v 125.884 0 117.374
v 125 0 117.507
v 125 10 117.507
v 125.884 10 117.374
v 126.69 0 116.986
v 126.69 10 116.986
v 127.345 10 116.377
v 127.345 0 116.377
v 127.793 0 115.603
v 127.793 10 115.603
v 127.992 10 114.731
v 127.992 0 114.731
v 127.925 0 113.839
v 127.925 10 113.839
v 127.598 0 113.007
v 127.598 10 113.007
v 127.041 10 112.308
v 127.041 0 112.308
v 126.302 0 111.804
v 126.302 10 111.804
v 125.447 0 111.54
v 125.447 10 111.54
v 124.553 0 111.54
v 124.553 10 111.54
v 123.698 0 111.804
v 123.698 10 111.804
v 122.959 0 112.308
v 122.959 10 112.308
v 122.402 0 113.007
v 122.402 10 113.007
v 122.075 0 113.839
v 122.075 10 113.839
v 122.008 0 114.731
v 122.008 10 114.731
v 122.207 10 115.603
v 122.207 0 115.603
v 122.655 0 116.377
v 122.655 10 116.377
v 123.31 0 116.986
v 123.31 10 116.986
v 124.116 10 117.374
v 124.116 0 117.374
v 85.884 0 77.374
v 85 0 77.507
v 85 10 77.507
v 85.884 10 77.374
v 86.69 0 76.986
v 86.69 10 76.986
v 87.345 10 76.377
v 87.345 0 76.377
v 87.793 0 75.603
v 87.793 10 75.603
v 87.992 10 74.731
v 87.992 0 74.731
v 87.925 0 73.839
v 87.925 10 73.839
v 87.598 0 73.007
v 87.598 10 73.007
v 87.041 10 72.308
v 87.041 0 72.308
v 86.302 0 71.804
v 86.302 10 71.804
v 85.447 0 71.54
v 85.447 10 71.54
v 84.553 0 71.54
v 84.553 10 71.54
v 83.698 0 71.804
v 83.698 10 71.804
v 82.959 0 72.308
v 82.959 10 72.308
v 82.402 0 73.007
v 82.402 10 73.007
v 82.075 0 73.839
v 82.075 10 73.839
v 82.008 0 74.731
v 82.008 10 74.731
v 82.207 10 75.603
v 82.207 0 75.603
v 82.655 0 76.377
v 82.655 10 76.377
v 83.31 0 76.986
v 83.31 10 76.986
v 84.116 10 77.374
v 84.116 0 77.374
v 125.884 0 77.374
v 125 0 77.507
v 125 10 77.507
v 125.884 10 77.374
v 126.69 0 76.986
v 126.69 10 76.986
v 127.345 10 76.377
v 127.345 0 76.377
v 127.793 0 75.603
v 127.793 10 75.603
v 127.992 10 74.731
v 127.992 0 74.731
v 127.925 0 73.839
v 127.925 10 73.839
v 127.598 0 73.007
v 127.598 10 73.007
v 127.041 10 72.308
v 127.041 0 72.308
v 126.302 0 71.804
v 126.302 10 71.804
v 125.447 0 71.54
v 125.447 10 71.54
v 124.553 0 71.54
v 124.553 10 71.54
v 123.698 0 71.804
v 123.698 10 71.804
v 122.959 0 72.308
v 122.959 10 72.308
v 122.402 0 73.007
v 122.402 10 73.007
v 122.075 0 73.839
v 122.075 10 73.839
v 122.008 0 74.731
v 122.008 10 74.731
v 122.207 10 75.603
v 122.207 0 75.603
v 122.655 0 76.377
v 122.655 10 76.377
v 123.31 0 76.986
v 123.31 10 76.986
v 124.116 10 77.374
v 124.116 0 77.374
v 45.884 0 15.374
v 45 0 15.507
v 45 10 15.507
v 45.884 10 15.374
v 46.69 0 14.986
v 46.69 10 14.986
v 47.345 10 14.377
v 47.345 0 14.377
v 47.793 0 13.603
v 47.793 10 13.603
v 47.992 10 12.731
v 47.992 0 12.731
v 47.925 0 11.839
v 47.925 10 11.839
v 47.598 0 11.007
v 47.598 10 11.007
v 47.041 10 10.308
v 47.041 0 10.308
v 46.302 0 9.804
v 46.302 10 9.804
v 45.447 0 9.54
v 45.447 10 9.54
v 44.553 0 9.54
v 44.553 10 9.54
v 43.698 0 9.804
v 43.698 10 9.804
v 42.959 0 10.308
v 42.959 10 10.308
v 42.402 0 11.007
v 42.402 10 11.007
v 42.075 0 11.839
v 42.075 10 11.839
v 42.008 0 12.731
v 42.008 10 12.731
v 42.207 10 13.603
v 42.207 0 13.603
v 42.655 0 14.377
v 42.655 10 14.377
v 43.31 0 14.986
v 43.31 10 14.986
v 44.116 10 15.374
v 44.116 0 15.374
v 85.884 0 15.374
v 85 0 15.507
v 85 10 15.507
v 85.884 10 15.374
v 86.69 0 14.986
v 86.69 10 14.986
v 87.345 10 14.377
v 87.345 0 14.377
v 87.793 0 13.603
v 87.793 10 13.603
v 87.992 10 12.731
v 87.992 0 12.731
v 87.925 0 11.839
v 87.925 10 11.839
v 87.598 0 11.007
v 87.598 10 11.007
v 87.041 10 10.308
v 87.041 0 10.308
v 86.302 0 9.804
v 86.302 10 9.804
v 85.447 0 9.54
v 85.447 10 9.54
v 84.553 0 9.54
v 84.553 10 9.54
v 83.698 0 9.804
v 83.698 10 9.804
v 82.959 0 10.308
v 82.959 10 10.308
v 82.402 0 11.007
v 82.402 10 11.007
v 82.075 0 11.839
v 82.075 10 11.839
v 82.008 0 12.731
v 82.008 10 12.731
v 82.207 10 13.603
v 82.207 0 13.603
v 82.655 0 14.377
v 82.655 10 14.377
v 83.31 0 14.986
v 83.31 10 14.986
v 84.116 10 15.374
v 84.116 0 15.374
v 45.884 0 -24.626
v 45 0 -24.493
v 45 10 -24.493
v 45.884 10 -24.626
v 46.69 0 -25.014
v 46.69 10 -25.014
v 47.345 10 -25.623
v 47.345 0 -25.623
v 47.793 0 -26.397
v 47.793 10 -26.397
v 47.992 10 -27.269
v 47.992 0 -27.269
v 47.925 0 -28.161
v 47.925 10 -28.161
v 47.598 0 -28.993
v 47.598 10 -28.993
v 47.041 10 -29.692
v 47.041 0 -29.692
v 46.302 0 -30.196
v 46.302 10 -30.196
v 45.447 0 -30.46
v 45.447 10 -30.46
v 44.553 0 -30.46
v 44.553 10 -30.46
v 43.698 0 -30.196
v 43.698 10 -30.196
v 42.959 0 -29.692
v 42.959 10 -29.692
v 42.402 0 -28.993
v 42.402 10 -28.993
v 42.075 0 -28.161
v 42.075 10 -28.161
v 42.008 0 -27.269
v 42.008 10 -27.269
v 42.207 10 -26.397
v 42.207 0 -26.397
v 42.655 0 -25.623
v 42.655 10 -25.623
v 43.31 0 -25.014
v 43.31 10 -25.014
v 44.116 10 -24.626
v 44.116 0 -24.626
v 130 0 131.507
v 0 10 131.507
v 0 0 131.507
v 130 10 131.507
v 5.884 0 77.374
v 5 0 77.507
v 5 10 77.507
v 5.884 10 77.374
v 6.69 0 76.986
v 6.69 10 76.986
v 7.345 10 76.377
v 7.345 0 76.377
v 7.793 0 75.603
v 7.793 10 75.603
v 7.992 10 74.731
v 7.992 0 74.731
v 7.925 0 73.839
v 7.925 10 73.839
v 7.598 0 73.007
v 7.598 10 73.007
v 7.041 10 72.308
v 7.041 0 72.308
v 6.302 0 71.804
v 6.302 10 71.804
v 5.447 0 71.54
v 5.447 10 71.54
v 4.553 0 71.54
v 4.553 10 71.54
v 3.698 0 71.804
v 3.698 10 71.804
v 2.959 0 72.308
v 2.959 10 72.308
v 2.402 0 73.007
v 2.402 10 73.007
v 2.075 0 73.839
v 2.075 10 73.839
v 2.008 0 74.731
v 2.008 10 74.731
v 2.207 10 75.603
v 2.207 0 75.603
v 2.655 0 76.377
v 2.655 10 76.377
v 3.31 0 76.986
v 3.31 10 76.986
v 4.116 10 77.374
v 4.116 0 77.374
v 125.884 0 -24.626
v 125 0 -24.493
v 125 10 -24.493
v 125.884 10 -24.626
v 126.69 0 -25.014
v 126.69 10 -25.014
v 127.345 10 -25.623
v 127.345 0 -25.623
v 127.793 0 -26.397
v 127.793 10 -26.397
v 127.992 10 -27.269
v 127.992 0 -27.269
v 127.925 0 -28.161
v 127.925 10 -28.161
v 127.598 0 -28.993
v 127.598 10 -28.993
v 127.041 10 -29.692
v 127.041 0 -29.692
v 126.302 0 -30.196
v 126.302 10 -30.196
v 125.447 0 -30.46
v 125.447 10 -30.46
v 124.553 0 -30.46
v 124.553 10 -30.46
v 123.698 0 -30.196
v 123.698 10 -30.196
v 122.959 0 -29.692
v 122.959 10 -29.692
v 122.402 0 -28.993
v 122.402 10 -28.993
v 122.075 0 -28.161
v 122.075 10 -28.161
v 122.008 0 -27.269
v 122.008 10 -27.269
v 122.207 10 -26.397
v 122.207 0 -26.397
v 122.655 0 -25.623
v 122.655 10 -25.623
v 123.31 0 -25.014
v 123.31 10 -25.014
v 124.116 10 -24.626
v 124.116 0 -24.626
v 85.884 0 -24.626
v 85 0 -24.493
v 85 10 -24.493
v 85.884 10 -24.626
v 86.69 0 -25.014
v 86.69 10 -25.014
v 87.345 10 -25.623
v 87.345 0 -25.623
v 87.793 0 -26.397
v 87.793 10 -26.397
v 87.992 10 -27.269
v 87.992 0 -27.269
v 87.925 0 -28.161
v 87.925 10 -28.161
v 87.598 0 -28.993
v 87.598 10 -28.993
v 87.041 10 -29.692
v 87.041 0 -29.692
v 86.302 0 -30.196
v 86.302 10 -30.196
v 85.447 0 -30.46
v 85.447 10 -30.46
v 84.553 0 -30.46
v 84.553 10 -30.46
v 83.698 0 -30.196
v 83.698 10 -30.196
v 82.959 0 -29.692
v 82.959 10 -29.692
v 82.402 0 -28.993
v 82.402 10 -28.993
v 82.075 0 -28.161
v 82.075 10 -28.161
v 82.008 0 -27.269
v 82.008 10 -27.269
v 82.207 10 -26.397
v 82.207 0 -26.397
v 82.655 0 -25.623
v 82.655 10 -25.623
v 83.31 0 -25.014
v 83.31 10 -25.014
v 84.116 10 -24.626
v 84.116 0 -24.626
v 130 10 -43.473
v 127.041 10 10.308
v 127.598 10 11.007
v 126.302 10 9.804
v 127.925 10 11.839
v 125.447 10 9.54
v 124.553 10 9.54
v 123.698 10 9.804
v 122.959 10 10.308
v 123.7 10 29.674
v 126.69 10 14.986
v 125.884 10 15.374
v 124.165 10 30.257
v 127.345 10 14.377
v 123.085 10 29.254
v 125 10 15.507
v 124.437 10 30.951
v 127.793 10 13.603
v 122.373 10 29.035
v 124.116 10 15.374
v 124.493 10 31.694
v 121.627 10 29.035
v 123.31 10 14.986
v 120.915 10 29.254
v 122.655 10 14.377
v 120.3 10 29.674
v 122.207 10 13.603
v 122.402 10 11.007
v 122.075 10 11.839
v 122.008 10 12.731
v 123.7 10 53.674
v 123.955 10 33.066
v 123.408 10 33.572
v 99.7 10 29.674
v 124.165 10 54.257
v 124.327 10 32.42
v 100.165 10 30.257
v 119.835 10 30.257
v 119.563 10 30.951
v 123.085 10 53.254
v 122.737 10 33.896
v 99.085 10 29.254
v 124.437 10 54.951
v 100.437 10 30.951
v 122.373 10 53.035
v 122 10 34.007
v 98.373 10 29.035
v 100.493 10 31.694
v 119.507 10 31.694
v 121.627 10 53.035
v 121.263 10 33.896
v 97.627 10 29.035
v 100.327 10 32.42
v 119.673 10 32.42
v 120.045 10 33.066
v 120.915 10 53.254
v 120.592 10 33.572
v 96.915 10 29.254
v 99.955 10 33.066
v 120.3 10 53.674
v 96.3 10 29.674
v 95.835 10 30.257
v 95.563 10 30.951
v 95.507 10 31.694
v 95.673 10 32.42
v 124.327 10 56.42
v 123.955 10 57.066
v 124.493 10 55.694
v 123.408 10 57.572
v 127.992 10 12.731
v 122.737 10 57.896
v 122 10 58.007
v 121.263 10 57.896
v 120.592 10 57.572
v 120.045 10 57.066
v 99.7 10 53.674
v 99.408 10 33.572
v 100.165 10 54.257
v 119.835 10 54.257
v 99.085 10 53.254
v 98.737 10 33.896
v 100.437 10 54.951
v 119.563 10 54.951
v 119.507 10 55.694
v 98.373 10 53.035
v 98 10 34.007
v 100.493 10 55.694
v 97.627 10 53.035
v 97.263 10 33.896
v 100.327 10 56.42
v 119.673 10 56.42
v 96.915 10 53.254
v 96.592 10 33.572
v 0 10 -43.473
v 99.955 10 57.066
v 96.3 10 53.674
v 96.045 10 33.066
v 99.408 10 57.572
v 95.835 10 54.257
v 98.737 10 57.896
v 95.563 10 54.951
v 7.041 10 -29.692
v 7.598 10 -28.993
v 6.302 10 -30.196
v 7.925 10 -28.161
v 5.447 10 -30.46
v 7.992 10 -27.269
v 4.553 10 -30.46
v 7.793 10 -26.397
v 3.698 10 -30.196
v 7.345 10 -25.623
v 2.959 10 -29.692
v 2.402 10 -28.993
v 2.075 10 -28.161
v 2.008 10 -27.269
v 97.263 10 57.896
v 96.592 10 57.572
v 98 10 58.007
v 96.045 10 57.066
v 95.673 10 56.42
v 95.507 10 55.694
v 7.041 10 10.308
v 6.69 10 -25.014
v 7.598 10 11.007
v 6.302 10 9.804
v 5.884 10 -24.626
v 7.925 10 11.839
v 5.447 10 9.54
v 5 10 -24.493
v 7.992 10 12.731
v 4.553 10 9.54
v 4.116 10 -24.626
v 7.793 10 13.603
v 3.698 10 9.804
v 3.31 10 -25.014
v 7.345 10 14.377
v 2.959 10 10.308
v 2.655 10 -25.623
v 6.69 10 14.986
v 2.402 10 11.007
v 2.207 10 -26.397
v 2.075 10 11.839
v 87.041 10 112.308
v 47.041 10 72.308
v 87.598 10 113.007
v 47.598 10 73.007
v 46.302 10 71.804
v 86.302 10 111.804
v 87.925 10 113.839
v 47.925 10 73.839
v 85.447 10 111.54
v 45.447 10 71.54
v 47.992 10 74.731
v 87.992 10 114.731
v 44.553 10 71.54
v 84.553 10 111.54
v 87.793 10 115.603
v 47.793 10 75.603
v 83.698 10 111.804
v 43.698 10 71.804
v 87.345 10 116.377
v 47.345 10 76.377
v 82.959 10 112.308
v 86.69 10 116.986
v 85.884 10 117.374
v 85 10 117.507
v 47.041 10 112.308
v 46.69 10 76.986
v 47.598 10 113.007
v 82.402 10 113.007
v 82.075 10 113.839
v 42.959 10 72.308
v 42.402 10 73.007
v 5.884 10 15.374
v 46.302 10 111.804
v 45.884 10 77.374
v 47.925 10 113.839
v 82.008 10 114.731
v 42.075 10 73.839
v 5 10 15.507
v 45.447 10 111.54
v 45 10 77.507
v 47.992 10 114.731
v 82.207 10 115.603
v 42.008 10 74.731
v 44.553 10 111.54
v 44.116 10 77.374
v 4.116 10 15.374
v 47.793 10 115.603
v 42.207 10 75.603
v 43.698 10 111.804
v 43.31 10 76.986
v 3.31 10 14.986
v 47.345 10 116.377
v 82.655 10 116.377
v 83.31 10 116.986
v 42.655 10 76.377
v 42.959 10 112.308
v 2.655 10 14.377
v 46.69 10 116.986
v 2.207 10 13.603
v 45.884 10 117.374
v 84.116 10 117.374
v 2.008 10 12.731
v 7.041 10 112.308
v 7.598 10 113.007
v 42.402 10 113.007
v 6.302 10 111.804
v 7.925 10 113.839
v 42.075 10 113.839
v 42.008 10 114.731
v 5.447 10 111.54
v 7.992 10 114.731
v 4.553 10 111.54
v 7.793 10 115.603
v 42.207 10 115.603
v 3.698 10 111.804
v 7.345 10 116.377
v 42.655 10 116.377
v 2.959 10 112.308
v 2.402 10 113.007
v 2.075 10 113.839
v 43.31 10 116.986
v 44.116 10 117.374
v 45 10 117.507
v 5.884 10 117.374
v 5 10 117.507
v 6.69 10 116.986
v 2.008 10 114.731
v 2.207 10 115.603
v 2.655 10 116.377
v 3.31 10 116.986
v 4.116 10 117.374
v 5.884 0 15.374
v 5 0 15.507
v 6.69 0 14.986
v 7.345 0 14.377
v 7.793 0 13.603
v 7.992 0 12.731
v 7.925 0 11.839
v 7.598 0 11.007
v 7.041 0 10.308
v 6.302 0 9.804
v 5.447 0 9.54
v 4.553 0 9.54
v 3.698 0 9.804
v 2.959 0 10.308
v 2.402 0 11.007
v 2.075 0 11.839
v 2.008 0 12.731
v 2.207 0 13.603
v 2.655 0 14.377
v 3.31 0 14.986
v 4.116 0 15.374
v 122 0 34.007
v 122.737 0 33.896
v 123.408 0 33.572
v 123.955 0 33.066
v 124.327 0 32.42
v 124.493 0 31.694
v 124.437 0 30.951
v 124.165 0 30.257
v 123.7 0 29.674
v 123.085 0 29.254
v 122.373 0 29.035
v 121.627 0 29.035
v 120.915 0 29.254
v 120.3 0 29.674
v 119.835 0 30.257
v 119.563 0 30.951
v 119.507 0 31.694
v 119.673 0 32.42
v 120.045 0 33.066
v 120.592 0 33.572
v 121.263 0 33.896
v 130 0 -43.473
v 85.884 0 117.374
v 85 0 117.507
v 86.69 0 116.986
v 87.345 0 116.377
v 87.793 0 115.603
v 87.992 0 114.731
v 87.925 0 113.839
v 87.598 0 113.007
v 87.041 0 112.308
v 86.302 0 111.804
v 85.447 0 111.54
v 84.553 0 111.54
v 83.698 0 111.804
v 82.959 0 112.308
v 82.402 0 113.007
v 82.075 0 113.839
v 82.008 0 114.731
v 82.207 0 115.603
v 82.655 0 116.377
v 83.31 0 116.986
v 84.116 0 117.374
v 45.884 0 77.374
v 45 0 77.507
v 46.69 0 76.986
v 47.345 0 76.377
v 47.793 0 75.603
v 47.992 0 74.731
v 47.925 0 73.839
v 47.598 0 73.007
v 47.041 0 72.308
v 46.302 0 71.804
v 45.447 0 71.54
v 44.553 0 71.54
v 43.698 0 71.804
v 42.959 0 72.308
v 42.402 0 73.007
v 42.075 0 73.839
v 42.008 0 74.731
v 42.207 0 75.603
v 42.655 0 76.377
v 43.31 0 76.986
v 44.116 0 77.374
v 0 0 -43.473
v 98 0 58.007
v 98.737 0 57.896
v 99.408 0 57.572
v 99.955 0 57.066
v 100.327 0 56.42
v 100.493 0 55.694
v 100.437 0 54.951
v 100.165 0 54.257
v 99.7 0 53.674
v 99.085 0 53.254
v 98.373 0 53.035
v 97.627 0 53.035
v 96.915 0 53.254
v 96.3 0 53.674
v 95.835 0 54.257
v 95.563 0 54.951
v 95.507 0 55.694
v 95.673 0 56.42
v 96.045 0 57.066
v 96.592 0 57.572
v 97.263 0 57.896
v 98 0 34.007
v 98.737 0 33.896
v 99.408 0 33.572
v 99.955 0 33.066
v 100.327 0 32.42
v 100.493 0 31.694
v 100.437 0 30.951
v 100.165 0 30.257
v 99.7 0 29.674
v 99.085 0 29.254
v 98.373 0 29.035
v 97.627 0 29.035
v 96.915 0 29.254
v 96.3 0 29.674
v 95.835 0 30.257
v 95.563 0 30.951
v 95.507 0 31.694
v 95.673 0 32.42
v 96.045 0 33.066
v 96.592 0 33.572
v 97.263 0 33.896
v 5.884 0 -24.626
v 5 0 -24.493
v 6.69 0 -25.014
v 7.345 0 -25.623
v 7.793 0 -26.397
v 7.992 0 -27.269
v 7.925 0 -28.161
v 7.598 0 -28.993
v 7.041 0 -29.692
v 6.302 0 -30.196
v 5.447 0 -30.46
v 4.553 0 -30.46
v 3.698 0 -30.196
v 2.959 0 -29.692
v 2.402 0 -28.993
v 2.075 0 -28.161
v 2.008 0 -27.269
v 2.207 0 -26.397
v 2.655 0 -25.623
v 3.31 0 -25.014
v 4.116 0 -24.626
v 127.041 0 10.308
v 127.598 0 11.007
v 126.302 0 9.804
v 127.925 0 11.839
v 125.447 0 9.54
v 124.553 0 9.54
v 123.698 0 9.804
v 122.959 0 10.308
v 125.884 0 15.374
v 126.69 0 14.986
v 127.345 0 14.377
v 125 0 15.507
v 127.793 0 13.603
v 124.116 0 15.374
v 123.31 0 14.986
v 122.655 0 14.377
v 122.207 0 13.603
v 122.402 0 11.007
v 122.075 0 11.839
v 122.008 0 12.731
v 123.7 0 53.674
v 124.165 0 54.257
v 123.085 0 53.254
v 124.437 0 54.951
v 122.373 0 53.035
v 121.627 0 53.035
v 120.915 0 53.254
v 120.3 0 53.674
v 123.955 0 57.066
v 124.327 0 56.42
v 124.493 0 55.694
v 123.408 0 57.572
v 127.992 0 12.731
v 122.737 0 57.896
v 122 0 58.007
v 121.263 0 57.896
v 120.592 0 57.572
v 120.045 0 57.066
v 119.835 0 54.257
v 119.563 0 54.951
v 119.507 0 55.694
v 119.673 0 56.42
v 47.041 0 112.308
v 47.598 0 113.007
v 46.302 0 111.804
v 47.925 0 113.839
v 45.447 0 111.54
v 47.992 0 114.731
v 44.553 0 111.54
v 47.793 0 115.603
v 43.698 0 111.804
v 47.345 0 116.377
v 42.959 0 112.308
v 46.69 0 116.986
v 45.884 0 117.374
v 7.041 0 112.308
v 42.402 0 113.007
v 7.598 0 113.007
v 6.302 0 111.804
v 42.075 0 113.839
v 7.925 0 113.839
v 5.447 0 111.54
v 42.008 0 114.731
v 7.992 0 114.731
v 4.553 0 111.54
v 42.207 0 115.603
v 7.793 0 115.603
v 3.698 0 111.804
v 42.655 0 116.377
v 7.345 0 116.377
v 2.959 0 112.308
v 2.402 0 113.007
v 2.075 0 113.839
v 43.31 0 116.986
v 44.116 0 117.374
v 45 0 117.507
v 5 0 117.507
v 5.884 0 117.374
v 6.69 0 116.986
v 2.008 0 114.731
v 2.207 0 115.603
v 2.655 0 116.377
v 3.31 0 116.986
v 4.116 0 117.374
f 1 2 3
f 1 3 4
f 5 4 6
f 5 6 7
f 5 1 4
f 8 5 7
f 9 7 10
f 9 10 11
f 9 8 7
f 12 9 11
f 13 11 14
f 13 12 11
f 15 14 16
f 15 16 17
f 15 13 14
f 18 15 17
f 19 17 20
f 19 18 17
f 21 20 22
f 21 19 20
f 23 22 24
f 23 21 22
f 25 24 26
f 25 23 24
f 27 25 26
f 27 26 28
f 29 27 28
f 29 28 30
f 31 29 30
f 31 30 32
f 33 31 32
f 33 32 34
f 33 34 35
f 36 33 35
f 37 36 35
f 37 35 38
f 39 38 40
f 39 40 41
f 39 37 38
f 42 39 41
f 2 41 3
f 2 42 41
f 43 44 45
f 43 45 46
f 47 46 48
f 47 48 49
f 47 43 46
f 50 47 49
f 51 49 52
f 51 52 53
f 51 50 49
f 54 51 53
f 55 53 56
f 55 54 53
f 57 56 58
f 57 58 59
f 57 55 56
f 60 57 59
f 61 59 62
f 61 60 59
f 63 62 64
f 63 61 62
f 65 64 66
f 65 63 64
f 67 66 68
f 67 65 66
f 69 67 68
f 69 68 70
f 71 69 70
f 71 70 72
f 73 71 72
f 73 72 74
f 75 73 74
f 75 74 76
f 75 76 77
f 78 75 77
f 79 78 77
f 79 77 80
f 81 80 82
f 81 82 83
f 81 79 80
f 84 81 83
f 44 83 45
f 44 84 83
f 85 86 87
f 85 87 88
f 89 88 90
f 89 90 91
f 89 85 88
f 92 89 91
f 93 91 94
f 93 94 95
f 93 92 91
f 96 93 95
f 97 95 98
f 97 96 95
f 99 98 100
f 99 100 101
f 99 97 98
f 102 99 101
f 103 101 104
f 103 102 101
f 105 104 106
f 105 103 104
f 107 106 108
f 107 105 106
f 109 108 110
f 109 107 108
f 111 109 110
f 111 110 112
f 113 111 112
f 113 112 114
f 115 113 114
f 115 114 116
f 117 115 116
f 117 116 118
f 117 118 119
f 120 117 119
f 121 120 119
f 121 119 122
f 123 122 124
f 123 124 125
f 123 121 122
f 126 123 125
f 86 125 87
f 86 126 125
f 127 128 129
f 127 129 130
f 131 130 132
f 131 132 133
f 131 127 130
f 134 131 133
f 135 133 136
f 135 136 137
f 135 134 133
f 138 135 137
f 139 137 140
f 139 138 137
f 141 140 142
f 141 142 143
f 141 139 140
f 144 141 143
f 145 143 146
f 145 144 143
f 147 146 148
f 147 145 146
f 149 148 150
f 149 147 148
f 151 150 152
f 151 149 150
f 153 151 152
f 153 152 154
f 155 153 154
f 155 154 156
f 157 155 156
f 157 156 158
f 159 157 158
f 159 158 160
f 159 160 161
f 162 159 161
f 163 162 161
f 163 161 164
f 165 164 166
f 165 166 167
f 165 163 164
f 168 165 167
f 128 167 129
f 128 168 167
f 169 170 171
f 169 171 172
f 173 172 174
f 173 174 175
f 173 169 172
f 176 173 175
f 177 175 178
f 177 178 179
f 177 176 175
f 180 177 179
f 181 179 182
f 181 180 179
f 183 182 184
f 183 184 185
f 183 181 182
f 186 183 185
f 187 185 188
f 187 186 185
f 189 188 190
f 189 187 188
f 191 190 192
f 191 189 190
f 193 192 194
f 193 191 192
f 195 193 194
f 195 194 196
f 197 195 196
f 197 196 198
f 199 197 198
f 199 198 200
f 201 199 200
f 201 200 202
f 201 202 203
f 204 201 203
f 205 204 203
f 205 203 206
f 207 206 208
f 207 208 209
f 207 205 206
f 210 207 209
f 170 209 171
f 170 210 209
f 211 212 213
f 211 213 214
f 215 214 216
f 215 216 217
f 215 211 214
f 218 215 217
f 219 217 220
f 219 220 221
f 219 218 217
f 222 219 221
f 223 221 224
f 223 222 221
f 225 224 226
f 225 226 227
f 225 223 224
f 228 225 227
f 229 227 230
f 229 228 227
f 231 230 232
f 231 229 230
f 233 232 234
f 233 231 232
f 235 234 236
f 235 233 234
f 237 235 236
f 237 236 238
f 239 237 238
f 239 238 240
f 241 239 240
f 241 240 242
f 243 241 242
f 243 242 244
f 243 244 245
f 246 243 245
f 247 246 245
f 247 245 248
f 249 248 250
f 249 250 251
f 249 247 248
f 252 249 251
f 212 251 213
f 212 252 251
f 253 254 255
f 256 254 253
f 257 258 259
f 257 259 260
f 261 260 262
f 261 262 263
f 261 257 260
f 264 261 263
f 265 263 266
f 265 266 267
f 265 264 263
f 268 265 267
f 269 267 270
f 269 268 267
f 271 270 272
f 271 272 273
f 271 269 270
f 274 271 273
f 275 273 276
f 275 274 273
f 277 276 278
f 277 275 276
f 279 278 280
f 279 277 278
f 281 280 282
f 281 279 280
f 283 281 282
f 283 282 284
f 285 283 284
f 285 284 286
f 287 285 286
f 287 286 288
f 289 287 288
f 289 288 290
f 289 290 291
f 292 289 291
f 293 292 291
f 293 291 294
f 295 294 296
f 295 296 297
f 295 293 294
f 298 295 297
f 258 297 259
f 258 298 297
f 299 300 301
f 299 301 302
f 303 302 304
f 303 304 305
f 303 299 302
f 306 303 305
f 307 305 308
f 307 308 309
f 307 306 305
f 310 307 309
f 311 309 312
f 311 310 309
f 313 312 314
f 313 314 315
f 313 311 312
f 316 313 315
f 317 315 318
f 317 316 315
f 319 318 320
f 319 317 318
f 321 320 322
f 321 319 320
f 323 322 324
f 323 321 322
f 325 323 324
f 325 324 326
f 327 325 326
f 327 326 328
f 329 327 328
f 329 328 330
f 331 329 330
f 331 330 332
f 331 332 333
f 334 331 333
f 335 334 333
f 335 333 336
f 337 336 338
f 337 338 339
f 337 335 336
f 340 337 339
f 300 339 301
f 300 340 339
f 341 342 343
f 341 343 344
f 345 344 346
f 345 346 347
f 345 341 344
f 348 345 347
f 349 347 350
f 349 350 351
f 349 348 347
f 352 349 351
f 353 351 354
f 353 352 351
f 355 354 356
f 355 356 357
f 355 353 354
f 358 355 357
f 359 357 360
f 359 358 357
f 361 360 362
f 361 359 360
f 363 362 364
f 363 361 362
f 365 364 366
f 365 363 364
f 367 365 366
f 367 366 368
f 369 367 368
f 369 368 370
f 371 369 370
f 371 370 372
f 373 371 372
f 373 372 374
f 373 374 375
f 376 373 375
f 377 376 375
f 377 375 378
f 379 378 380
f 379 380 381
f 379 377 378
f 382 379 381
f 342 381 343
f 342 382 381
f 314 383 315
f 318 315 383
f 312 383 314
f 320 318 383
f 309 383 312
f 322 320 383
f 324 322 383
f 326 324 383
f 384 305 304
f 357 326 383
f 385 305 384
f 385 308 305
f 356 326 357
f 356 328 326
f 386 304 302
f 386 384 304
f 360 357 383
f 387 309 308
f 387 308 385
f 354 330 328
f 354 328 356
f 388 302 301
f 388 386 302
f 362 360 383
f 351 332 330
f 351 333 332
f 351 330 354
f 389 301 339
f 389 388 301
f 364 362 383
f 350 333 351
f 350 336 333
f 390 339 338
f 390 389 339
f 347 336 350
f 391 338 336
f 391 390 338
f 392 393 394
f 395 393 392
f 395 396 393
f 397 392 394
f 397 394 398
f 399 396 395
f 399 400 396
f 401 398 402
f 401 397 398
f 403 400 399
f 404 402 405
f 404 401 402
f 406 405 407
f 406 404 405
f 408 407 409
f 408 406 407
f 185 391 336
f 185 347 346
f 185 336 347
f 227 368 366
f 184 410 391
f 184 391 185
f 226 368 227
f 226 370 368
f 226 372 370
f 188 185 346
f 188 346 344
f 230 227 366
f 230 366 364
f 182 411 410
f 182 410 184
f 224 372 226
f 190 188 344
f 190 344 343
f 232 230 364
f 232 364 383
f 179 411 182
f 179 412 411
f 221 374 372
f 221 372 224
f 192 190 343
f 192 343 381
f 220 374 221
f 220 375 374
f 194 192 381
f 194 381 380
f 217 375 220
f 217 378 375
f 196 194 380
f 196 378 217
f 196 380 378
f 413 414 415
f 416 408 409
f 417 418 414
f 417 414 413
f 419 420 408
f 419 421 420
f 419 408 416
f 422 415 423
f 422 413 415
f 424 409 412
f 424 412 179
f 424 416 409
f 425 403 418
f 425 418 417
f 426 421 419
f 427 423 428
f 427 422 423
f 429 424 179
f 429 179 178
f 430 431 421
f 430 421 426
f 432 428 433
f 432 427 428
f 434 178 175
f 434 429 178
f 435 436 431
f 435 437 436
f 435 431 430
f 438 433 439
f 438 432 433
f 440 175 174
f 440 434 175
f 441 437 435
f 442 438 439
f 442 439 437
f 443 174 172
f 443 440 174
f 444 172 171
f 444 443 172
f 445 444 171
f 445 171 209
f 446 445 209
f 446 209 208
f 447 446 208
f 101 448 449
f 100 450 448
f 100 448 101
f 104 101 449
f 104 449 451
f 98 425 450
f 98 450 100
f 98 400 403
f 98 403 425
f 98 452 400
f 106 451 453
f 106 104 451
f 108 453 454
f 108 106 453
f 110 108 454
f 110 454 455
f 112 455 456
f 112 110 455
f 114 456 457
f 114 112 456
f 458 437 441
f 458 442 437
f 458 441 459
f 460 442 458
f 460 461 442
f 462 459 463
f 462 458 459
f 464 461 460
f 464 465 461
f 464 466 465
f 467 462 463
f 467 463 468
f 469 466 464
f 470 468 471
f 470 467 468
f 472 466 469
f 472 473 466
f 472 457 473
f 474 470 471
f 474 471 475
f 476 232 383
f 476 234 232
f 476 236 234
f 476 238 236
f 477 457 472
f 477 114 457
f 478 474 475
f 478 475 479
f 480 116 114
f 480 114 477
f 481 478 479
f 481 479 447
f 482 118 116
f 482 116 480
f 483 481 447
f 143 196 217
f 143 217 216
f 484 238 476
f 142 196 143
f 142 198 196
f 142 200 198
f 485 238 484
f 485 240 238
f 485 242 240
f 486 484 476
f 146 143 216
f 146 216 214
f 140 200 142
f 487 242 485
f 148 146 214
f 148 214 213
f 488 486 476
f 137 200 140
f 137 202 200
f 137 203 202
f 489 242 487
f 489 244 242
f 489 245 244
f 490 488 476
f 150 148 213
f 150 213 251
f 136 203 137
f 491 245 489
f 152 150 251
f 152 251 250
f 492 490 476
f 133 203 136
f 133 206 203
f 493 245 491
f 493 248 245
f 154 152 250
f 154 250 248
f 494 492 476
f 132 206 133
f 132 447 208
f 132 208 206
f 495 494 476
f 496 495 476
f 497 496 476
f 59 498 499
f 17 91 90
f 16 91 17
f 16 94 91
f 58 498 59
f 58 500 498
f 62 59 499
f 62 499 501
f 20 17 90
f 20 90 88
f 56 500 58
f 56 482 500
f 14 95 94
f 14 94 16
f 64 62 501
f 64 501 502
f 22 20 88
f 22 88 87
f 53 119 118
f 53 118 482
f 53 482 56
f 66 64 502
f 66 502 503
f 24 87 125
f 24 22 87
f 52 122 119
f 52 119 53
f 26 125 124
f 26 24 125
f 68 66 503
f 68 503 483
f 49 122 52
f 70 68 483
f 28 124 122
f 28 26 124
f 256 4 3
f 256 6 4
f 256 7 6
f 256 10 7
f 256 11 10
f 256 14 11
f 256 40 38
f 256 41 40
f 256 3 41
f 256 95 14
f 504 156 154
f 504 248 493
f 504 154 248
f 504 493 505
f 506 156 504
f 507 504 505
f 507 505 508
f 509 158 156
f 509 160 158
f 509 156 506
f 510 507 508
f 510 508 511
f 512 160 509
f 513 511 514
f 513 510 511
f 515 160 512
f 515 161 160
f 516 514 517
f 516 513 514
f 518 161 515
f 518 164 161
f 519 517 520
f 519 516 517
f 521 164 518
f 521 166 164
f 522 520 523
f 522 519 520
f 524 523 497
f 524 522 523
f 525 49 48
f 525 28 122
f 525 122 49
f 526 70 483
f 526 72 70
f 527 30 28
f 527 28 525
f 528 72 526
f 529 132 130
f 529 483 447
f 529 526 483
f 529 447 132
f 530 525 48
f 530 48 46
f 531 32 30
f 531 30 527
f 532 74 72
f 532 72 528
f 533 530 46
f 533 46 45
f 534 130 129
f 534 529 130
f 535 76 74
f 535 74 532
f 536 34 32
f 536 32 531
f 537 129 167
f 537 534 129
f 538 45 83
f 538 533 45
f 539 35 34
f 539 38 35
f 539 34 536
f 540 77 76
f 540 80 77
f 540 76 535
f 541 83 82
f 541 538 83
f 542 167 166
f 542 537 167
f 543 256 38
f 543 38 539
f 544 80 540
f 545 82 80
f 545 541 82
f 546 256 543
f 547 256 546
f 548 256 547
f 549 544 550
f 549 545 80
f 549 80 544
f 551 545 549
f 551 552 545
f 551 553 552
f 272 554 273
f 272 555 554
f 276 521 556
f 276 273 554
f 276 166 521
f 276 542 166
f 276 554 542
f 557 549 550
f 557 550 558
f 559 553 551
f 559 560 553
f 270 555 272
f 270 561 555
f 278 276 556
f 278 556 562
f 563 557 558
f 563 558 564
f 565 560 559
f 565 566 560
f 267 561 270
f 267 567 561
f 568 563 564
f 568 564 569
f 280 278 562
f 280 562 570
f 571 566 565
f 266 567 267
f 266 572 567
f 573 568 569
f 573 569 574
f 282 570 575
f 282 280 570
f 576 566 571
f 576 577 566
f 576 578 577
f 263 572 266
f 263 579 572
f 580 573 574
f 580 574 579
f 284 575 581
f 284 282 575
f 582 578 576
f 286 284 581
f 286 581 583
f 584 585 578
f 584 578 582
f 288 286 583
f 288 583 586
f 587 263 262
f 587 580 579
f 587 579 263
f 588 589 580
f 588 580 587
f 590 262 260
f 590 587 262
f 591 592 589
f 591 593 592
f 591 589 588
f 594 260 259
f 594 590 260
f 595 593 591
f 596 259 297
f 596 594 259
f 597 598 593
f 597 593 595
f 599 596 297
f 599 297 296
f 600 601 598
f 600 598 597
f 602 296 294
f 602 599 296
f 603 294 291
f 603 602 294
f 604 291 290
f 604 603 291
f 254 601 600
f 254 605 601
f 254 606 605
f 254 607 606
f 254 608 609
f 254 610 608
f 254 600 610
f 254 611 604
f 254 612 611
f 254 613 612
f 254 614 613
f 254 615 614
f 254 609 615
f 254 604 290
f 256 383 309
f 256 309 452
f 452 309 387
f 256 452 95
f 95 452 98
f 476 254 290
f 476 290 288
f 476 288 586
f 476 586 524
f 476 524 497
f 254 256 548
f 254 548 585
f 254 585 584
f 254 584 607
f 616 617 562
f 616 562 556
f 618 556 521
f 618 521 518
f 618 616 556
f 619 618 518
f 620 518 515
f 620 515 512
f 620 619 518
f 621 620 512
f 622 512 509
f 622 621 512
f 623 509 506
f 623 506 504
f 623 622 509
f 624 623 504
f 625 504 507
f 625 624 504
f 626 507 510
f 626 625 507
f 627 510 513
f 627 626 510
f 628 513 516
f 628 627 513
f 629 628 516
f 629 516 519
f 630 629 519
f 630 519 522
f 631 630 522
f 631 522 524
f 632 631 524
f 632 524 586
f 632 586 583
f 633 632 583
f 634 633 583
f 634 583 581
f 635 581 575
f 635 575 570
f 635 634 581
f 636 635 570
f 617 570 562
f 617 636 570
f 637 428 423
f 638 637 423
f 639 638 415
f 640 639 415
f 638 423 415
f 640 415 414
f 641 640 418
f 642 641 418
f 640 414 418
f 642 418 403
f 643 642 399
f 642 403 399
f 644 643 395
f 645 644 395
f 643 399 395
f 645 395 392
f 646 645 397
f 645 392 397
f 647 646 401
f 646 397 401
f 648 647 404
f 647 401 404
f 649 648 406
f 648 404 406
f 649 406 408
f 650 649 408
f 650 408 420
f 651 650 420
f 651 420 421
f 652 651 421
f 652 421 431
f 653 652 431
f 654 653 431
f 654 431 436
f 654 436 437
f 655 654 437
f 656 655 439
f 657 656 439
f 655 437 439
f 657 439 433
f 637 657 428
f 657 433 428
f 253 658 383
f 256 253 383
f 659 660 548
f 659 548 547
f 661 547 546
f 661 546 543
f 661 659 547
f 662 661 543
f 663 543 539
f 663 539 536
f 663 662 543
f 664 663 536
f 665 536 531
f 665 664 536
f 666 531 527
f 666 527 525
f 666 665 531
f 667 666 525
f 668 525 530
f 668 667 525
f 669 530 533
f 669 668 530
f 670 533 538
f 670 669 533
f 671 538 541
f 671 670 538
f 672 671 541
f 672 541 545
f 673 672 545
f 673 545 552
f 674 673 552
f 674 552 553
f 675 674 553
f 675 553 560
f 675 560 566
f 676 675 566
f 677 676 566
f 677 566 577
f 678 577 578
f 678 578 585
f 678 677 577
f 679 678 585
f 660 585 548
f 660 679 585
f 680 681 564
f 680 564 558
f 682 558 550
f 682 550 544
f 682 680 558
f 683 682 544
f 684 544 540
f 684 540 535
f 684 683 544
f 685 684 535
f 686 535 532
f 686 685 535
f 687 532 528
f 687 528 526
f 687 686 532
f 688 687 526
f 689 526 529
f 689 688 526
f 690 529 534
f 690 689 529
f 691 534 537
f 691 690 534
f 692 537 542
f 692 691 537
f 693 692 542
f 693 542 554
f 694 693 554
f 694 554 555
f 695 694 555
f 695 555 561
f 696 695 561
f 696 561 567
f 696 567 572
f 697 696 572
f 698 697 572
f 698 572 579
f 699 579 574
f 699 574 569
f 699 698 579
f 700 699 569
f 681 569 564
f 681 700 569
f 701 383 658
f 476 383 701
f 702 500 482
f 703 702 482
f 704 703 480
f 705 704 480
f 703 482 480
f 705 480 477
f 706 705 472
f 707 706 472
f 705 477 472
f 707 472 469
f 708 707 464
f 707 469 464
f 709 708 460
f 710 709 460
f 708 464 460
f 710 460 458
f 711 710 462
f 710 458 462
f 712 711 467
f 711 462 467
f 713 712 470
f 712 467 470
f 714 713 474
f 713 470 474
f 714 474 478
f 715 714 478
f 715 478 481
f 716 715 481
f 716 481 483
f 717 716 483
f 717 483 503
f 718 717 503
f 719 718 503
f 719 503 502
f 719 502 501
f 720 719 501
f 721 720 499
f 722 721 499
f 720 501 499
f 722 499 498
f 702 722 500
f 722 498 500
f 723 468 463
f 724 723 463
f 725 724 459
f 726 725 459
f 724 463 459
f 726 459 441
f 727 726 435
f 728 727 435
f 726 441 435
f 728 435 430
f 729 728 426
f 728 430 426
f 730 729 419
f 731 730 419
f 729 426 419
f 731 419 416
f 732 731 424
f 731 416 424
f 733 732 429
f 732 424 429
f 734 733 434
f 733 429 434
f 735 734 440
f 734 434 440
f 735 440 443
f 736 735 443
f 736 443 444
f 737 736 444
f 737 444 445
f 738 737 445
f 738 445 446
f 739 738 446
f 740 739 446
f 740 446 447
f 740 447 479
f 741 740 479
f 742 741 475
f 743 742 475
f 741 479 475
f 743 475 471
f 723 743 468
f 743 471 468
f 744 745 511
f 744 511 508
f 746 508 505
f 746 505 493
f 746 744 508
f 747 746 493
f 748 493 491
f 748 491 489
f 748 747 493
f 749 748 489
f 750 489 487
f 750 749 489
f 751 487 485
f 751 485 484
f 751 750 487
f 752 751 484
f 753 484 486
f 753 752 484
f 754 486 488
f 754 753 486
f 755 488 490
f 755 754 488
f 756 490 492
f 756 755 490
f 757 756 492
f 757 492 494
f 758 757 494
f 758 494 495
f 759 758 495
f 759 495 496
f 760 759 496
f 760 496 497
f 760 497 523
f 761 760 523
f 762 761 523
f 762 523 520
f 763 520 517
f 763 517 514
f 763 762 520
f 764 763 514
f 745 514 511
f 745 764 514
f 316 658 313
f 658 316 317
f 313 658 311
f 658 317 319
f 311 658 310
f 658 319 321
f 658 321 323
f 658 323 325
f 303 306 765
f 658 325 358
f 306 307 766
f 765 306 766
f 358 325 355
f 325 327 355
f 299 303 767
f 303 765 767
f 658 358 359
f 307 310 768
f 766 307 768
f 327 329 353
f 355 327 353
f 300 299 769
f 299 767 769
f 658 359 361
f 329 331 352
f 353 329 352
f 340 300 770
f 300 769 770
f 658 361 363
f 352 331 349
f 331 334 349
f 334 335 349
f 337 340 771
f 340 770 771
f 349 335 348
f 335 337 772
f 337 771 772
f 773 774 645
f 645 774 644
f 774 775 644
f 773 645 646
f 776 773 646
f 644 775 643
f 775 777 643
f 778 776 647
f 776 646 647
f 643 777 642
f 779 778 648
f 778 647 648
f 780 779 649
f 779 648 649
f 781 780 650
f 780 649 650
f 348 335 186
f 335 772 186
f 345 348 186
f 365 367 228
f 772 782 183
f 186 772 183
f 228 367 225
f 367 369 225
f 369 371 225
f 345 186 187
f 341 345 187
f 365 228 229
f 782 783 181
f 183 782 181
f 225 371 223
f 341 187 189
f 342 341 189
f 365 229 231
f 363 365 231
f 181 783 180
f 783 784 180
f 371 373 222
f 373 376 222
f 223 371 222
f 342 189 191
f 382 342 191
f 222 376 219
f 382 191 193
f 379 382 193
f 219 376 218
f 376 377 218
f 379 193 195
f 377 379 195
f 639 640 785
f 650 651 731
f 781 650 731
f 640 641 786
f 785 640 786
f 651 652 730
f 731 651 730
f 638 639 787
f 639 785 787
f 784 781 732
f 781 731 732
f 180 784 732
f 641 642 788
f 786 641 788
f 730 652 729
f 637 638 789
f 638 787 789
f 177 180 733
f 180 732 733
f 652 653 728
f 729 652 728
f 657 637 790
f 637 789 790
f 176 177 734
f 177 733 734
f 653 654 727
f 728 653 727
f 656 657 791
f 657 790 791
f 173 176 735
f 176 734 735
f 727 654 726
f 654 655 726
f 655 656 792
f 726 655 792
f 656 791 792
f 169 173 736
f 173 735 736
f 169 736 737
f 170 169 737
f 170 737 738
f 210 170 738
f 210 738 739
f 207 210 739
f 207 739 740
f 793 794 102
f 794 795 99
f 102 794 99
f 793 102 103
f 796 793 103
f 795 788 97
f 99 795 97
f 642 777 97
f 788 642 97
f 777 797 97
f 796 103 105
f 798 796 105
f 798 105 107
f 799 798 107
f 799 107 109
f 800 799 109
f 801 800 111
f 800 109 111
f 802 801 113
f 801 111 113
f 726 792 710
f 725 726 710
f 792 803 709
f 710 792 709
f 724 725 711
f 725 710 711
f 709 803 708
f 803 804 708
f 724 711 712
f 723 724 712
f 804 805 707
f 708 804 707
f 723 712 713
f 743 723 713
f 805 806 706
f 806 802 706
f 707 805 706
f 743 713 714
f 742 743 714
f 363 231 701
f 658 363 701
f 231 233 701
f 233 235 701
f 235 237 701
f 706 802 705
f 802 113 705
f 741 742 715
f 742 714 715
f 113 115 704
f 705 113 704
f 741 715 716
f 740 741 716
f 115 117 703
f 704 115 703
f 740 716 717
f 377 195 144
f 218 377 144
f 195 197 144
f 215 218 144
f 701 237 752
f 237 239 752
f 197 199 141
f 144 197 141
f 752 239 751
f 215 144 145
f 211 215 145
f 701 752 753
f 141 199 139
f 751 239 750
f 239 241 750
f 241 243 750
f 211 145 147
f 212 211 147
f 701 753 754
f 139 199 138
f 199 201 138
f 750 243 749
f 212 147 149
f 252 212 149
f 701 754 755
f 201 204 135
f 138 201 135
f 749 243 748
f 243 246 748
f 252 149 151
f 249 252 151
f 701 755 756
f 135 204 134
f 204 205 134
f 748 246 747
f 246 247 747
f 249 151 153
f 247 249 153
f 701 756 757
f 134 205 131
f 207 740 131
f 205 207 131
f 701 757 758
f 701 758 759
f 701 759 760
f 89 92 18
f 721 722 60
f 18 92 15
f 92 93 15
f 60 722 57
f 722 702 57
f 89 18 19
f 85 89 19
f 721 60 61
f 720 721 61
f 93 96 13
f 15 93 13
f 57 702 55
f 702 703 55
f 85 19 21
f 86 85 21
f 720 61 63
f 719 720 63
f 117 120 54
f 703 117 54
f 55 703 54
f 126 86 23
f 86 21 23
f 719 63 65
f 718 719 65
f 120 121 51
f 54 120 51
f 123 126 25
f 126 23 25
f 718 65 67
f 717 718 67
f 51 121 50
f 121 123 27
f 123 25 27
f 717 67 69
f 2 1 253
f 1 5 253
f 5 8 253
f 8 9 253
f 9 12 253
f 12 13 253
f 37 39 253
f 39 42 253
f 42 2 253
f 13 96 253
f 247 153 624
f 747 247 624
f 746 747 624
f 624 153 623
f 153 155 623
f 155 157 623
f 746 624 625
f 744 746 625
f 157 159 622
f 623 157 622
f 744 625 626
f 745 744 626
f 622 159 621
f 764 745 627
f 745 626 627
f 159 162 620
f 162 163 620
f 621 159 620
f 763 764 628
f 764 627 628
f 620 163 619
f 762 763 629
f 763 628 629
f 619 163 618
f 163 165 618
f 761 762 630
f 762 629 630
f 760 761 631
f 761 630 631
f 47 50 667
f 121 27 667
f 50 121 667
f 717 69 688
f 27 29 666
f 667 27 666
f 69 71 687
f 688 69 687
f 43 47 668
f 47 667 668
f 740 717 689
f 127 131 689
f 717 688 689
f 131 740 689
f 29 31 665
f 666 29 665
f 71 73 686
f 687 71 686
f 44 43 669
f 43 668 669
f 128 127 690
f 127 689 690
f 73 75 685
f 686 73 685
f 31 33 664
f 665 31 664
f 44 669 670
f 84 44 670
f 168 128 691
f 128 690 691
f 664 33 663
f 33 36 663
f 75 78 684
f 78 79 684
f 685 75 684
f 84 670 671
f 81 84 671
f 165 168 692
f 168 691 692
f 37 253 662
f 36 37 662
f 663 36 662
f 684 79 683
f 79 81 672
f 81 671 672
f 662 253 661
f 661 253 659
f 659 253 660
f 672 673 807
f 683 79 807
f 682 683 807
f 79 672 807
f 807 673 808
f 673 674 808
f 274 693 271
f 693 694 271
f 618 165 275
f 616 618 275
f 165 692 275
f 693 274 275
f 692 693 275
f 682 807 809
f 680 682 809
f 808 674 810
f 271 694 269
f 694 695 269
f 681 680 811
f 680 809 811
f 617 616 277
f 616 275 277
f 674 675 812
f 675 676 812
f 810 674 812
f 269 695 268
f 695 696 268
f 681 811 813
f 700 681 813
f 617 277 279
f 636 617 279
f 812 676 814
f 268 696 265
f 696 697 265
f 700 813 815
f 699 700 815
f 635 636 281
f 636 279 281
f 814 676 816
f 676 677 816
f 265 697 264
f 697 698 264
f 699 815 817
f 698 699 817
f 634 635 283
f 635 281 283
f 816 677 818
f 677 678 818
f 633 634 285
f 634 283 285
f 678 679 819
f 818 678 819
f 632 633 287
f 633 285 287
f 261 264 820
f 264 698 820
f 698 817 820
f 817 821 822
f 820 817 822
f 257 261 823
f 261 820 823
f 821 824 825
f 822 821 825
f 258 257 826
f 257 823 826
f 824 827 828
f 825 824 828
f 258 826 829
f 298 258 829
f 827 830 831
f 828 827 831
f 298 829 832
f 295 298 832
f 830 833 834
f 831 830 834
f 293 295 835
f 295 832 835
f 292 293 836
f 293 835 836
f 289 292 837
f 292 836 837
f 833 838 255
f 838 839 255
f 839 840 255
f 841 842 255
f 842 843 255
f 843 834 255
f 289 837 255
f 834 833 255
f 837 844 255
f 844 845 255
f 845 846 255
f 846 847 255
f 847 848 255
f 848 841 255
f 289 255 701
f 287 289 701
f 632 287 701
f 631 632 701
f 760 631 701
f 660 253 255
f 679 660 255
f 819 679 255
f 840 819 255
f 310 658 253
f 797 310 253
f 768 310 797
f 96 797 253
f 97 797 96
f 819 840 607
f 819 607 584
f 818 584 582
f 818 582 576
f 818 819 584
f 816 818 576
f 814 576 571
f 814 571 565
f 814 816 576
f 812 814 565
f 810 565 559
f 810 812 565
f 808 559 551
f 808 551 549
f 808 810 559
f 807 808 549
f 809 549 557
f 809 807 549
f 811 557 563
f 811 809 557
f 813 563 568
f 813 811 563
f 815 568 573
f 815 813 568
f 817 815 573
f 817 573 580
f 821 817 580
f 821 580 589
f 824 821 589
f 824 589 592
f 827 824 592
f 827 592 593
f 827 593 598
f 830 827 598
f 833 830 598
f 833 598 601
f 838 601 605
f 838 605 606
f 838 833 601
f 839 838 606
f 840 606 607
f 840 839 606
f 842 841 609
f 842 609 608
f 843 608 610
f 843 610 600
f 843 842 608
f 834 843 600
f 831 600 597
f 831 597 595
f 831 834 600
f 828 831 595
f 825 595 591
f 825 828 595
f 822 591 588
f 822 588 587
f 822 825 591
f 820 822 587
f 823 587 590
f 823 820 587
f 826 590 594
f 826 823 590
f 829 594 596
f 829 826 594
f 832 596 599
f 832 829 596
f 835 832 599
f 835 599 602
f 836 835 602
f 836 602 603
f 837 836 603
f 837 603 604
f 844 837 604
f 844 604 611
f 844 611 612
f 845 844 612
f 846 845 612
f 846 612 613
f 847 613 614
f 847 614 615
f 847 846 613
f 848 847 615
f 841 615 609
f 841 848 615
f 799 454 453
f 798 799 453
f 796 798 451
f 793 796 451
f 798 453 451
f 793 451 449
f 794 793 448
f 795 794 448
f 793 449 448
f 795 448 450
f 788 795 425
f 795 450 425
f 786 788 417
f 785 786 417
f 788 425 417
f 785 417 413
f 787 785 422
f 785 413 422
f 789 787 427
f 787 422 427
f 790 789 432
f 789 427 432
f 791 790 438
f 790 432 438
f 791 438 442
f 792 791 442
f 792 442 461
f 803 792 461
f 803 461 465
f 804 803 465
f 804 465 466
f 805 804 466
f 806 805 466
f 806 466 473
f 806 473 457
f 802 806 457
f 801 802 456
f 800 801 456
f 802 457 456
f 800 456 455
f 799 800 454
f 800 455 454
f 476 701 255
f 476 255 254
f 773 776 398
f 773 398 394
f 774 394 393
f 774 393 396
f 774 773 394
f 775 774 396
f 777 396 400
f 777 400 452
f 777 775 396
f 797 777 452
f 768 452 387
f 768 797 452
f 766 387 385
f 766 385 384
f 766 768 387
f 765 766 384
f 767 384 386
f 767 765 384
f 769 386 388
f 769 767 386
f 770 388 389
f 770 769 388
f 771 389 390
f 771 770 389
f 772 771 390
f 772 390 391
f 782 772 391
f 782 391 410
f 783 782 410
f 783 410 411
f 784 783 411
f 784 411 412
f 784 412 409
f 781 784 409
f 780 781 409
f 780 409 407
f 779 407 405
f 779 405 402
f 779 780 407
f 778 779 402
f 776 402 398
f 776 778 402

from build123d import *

# Parameters (mm, degrees)
SKETCH1_W           = 130
SKETCH1_H           = 156
SKETCH1_R           = 3
BOSS_EXTRUDE1_DEPTH = 10
SKETCH2_R           = 2.5
CUT_EXTRUDE1_DEPTH  = 10
SKETCH3_W           = 130
SKETCH3_H           = 10
BOSS_EXTRUDE2_DEPTH = 10
SKETCH4_W           = 130
SKETCH4_H           = 10
CUT_EXTRUDE2_DEPTH  = 10
SKETCH5_W           = 130
SKETCH5_H           = 10
BOSS_EXTRUDE3_DEPTH = 10
SKETCH6_W           = 130
SKETCH6_H           = 10
BOSS_EXTRUDE4_DEPTH = 8.98


with BuildPart() as part:
    # Sketch1 → Boss-Extrude1 (new body)
    with BuildSketch(Plane(origin=(0, 0, 0), x_dir=(1, 0, 0), z_dir=(0, 1, 0))):
        with Locations((65, -43.506875339)):
            Rectangle(SKETCH1_W, SKETCH1_H)
        with Locations(Location((5, 27.493124661, 0), (0, 0, 270))):
            Circle(SKETCH1_R, mode=Mode.SUBTRACT)
        with Locations(Location((45, 27.493124661, 0), (0, 0, 270))):
            Circle(SKETCH1_R, mode=Mode.SUBTRACT)
        with Locations(Location((45, -12.506875339, 0), (0, 0, 270))):
            Circle(SKETCH1_R, mode=Mode.SUBTRACT)
        with Locations(Location((5, -12.506875339, 0), (0, 0, 270))):
            Circle(SKETCH1_R, mode=Mode.SUBTRACT)
        with Locations(Location((85, 27.493124661, 0), (0, 0, 270))):
            Circle(SKETCH1_R, mode=Mode.SUBTRACT)
        with Locations(Location((125, 27.493124661, 0), (0, 0, 270))):
            Circle(SKETCH1_R, mode=Mode.SUBTRACT)
        with Locations(Location((85, -12.506875339, 0), (0, 0, 270))):
            Circle(SKETCH1_R, mode=Mode.SUBTRACT)
        with Locations(Location((125, -12.506875339, 0), (0, 0, 270))):
            Circle(SKETCH1_R, mode=Mode.SUBTRACT)
        with Locations(Location((85, -74.506875339, 0), (0, 0, 270))):
            Circle(SKETCH1_R, mode=Mode.SUBTRACT)
        with Locations(Location((125, -74.506875339, 0), (0, 0, 270))):
            Circle(SKETCH1_R, mode=Mode.SUBTRACT)
        with Locations(Location((125, -114.506875339, 0), (0, 0, 270))):
            Circle(SKETCH1_R, mode=Mode.SUBTRACT)
        with Locations(Location((85, -114.506875339, 0), (0, 0, 270))):
            Circle(SKETCH1_R, mode=Mode.SUBTRACT)
        with Locations(Location((5, -74.506875339, 0), (0, 0, 270))):
            Circle(SKETCH1_R, mode=Mode.SUBTRACT)
        with Locations(Location((45, -74.506875339, 0), (0, 0, 270))):
            Circle(SKETCH1_R, mode=Mode.SUBTRACT)
        with Locations(Location((5, -114.506875339, 0), (0, 0, 270))):
            Circle(SKETCH1_R, mode=Mode.SUBTRACT)
        with Locations(Location((45, -114.506875339, 0), (0, 0, 270))):
            Circle(SKETCH1_R, mode=Mode.SUBTRACT)
    extrude(amount=BOSS_EXTRUDE1_DEPTH)

    # Sketch2 → Cut-Extrude1 (cut)
    with BuildSketch(Plane(origin=(0, 10, 0), x_dir=(1, 0, 0), z_dir=(0, 1, 0))):
        with Locations(Location((98, -31.506875339, 0), (0, 0, 270))):
            Circle(SKETCH2_R)
        with Locations(Location((98, -55.506875339, 0), (0, 0, 270))):
            Circle(SKETCH2_R)
        with Locations(Location((122, -55.506875339, 0), (0, 0, 270))):
            Circle(SKETCH2_R)
        with Locations(Location((122, -31.506875339, 0), (0, 0, 270))):
            Circle(SKETCH2_R)
    extrude(amount=-CUT_EXTRUDE1_DEPTH, mode=Mode.SUBTRACT)

    # Sketch3 → Boss-Extrude2 (add)
    with BuildSketch(Plane(origin=(0, 0, -34.493124661), x_dir=(-1, 0, 0), z_dir=(0, 0, -1))):
        with Locations((-65, 5)):
            Rectangle(SKETCH3_W, SKETCH3_H)
    extrude(amount=BOSS_EXTRUDE2_DEPTH)

    # Sketch4 → Cut-Extrude2 (cut)
    with BuildSketch(Plane(origin=(0, 0, -44.493124661), x_dir=(-1, 0, 0), z_dir=(0, 0, -1))):
        with Locations((-65, 5)):
            Rectangle(SKETCH4_W, SKETCH4_H)
    extrude(amount=-CUT_EXTRUDE2_DEPTH, mode=Mode.SUBTRACT)

    # Sketch5 → Boss-Extrude3 (add)
    with BuildSketch(Plane.XY.offset(121.506875339)):
        with Locations((65, 5)):
            Rectangle(SKETCH5_W, SKETCH5_H)
    extrude(amount=BOSS_EXTRUDE3_DEPTH)

    # Sketch6 → Boss-Extrude4 (add)
    with BuildSketch(Plane(origin=(0, 0, -34.493124661), x_dir=(-1, 0, 0), z_dir=(0, 0, -1))):
        with Locations((-65, 5)):
            Rectangle(SKETCH6_W, SKETCH6_H)
    extrude(amount=BOSS_EXTRUDE4_DEPTH)


solid = part.part
